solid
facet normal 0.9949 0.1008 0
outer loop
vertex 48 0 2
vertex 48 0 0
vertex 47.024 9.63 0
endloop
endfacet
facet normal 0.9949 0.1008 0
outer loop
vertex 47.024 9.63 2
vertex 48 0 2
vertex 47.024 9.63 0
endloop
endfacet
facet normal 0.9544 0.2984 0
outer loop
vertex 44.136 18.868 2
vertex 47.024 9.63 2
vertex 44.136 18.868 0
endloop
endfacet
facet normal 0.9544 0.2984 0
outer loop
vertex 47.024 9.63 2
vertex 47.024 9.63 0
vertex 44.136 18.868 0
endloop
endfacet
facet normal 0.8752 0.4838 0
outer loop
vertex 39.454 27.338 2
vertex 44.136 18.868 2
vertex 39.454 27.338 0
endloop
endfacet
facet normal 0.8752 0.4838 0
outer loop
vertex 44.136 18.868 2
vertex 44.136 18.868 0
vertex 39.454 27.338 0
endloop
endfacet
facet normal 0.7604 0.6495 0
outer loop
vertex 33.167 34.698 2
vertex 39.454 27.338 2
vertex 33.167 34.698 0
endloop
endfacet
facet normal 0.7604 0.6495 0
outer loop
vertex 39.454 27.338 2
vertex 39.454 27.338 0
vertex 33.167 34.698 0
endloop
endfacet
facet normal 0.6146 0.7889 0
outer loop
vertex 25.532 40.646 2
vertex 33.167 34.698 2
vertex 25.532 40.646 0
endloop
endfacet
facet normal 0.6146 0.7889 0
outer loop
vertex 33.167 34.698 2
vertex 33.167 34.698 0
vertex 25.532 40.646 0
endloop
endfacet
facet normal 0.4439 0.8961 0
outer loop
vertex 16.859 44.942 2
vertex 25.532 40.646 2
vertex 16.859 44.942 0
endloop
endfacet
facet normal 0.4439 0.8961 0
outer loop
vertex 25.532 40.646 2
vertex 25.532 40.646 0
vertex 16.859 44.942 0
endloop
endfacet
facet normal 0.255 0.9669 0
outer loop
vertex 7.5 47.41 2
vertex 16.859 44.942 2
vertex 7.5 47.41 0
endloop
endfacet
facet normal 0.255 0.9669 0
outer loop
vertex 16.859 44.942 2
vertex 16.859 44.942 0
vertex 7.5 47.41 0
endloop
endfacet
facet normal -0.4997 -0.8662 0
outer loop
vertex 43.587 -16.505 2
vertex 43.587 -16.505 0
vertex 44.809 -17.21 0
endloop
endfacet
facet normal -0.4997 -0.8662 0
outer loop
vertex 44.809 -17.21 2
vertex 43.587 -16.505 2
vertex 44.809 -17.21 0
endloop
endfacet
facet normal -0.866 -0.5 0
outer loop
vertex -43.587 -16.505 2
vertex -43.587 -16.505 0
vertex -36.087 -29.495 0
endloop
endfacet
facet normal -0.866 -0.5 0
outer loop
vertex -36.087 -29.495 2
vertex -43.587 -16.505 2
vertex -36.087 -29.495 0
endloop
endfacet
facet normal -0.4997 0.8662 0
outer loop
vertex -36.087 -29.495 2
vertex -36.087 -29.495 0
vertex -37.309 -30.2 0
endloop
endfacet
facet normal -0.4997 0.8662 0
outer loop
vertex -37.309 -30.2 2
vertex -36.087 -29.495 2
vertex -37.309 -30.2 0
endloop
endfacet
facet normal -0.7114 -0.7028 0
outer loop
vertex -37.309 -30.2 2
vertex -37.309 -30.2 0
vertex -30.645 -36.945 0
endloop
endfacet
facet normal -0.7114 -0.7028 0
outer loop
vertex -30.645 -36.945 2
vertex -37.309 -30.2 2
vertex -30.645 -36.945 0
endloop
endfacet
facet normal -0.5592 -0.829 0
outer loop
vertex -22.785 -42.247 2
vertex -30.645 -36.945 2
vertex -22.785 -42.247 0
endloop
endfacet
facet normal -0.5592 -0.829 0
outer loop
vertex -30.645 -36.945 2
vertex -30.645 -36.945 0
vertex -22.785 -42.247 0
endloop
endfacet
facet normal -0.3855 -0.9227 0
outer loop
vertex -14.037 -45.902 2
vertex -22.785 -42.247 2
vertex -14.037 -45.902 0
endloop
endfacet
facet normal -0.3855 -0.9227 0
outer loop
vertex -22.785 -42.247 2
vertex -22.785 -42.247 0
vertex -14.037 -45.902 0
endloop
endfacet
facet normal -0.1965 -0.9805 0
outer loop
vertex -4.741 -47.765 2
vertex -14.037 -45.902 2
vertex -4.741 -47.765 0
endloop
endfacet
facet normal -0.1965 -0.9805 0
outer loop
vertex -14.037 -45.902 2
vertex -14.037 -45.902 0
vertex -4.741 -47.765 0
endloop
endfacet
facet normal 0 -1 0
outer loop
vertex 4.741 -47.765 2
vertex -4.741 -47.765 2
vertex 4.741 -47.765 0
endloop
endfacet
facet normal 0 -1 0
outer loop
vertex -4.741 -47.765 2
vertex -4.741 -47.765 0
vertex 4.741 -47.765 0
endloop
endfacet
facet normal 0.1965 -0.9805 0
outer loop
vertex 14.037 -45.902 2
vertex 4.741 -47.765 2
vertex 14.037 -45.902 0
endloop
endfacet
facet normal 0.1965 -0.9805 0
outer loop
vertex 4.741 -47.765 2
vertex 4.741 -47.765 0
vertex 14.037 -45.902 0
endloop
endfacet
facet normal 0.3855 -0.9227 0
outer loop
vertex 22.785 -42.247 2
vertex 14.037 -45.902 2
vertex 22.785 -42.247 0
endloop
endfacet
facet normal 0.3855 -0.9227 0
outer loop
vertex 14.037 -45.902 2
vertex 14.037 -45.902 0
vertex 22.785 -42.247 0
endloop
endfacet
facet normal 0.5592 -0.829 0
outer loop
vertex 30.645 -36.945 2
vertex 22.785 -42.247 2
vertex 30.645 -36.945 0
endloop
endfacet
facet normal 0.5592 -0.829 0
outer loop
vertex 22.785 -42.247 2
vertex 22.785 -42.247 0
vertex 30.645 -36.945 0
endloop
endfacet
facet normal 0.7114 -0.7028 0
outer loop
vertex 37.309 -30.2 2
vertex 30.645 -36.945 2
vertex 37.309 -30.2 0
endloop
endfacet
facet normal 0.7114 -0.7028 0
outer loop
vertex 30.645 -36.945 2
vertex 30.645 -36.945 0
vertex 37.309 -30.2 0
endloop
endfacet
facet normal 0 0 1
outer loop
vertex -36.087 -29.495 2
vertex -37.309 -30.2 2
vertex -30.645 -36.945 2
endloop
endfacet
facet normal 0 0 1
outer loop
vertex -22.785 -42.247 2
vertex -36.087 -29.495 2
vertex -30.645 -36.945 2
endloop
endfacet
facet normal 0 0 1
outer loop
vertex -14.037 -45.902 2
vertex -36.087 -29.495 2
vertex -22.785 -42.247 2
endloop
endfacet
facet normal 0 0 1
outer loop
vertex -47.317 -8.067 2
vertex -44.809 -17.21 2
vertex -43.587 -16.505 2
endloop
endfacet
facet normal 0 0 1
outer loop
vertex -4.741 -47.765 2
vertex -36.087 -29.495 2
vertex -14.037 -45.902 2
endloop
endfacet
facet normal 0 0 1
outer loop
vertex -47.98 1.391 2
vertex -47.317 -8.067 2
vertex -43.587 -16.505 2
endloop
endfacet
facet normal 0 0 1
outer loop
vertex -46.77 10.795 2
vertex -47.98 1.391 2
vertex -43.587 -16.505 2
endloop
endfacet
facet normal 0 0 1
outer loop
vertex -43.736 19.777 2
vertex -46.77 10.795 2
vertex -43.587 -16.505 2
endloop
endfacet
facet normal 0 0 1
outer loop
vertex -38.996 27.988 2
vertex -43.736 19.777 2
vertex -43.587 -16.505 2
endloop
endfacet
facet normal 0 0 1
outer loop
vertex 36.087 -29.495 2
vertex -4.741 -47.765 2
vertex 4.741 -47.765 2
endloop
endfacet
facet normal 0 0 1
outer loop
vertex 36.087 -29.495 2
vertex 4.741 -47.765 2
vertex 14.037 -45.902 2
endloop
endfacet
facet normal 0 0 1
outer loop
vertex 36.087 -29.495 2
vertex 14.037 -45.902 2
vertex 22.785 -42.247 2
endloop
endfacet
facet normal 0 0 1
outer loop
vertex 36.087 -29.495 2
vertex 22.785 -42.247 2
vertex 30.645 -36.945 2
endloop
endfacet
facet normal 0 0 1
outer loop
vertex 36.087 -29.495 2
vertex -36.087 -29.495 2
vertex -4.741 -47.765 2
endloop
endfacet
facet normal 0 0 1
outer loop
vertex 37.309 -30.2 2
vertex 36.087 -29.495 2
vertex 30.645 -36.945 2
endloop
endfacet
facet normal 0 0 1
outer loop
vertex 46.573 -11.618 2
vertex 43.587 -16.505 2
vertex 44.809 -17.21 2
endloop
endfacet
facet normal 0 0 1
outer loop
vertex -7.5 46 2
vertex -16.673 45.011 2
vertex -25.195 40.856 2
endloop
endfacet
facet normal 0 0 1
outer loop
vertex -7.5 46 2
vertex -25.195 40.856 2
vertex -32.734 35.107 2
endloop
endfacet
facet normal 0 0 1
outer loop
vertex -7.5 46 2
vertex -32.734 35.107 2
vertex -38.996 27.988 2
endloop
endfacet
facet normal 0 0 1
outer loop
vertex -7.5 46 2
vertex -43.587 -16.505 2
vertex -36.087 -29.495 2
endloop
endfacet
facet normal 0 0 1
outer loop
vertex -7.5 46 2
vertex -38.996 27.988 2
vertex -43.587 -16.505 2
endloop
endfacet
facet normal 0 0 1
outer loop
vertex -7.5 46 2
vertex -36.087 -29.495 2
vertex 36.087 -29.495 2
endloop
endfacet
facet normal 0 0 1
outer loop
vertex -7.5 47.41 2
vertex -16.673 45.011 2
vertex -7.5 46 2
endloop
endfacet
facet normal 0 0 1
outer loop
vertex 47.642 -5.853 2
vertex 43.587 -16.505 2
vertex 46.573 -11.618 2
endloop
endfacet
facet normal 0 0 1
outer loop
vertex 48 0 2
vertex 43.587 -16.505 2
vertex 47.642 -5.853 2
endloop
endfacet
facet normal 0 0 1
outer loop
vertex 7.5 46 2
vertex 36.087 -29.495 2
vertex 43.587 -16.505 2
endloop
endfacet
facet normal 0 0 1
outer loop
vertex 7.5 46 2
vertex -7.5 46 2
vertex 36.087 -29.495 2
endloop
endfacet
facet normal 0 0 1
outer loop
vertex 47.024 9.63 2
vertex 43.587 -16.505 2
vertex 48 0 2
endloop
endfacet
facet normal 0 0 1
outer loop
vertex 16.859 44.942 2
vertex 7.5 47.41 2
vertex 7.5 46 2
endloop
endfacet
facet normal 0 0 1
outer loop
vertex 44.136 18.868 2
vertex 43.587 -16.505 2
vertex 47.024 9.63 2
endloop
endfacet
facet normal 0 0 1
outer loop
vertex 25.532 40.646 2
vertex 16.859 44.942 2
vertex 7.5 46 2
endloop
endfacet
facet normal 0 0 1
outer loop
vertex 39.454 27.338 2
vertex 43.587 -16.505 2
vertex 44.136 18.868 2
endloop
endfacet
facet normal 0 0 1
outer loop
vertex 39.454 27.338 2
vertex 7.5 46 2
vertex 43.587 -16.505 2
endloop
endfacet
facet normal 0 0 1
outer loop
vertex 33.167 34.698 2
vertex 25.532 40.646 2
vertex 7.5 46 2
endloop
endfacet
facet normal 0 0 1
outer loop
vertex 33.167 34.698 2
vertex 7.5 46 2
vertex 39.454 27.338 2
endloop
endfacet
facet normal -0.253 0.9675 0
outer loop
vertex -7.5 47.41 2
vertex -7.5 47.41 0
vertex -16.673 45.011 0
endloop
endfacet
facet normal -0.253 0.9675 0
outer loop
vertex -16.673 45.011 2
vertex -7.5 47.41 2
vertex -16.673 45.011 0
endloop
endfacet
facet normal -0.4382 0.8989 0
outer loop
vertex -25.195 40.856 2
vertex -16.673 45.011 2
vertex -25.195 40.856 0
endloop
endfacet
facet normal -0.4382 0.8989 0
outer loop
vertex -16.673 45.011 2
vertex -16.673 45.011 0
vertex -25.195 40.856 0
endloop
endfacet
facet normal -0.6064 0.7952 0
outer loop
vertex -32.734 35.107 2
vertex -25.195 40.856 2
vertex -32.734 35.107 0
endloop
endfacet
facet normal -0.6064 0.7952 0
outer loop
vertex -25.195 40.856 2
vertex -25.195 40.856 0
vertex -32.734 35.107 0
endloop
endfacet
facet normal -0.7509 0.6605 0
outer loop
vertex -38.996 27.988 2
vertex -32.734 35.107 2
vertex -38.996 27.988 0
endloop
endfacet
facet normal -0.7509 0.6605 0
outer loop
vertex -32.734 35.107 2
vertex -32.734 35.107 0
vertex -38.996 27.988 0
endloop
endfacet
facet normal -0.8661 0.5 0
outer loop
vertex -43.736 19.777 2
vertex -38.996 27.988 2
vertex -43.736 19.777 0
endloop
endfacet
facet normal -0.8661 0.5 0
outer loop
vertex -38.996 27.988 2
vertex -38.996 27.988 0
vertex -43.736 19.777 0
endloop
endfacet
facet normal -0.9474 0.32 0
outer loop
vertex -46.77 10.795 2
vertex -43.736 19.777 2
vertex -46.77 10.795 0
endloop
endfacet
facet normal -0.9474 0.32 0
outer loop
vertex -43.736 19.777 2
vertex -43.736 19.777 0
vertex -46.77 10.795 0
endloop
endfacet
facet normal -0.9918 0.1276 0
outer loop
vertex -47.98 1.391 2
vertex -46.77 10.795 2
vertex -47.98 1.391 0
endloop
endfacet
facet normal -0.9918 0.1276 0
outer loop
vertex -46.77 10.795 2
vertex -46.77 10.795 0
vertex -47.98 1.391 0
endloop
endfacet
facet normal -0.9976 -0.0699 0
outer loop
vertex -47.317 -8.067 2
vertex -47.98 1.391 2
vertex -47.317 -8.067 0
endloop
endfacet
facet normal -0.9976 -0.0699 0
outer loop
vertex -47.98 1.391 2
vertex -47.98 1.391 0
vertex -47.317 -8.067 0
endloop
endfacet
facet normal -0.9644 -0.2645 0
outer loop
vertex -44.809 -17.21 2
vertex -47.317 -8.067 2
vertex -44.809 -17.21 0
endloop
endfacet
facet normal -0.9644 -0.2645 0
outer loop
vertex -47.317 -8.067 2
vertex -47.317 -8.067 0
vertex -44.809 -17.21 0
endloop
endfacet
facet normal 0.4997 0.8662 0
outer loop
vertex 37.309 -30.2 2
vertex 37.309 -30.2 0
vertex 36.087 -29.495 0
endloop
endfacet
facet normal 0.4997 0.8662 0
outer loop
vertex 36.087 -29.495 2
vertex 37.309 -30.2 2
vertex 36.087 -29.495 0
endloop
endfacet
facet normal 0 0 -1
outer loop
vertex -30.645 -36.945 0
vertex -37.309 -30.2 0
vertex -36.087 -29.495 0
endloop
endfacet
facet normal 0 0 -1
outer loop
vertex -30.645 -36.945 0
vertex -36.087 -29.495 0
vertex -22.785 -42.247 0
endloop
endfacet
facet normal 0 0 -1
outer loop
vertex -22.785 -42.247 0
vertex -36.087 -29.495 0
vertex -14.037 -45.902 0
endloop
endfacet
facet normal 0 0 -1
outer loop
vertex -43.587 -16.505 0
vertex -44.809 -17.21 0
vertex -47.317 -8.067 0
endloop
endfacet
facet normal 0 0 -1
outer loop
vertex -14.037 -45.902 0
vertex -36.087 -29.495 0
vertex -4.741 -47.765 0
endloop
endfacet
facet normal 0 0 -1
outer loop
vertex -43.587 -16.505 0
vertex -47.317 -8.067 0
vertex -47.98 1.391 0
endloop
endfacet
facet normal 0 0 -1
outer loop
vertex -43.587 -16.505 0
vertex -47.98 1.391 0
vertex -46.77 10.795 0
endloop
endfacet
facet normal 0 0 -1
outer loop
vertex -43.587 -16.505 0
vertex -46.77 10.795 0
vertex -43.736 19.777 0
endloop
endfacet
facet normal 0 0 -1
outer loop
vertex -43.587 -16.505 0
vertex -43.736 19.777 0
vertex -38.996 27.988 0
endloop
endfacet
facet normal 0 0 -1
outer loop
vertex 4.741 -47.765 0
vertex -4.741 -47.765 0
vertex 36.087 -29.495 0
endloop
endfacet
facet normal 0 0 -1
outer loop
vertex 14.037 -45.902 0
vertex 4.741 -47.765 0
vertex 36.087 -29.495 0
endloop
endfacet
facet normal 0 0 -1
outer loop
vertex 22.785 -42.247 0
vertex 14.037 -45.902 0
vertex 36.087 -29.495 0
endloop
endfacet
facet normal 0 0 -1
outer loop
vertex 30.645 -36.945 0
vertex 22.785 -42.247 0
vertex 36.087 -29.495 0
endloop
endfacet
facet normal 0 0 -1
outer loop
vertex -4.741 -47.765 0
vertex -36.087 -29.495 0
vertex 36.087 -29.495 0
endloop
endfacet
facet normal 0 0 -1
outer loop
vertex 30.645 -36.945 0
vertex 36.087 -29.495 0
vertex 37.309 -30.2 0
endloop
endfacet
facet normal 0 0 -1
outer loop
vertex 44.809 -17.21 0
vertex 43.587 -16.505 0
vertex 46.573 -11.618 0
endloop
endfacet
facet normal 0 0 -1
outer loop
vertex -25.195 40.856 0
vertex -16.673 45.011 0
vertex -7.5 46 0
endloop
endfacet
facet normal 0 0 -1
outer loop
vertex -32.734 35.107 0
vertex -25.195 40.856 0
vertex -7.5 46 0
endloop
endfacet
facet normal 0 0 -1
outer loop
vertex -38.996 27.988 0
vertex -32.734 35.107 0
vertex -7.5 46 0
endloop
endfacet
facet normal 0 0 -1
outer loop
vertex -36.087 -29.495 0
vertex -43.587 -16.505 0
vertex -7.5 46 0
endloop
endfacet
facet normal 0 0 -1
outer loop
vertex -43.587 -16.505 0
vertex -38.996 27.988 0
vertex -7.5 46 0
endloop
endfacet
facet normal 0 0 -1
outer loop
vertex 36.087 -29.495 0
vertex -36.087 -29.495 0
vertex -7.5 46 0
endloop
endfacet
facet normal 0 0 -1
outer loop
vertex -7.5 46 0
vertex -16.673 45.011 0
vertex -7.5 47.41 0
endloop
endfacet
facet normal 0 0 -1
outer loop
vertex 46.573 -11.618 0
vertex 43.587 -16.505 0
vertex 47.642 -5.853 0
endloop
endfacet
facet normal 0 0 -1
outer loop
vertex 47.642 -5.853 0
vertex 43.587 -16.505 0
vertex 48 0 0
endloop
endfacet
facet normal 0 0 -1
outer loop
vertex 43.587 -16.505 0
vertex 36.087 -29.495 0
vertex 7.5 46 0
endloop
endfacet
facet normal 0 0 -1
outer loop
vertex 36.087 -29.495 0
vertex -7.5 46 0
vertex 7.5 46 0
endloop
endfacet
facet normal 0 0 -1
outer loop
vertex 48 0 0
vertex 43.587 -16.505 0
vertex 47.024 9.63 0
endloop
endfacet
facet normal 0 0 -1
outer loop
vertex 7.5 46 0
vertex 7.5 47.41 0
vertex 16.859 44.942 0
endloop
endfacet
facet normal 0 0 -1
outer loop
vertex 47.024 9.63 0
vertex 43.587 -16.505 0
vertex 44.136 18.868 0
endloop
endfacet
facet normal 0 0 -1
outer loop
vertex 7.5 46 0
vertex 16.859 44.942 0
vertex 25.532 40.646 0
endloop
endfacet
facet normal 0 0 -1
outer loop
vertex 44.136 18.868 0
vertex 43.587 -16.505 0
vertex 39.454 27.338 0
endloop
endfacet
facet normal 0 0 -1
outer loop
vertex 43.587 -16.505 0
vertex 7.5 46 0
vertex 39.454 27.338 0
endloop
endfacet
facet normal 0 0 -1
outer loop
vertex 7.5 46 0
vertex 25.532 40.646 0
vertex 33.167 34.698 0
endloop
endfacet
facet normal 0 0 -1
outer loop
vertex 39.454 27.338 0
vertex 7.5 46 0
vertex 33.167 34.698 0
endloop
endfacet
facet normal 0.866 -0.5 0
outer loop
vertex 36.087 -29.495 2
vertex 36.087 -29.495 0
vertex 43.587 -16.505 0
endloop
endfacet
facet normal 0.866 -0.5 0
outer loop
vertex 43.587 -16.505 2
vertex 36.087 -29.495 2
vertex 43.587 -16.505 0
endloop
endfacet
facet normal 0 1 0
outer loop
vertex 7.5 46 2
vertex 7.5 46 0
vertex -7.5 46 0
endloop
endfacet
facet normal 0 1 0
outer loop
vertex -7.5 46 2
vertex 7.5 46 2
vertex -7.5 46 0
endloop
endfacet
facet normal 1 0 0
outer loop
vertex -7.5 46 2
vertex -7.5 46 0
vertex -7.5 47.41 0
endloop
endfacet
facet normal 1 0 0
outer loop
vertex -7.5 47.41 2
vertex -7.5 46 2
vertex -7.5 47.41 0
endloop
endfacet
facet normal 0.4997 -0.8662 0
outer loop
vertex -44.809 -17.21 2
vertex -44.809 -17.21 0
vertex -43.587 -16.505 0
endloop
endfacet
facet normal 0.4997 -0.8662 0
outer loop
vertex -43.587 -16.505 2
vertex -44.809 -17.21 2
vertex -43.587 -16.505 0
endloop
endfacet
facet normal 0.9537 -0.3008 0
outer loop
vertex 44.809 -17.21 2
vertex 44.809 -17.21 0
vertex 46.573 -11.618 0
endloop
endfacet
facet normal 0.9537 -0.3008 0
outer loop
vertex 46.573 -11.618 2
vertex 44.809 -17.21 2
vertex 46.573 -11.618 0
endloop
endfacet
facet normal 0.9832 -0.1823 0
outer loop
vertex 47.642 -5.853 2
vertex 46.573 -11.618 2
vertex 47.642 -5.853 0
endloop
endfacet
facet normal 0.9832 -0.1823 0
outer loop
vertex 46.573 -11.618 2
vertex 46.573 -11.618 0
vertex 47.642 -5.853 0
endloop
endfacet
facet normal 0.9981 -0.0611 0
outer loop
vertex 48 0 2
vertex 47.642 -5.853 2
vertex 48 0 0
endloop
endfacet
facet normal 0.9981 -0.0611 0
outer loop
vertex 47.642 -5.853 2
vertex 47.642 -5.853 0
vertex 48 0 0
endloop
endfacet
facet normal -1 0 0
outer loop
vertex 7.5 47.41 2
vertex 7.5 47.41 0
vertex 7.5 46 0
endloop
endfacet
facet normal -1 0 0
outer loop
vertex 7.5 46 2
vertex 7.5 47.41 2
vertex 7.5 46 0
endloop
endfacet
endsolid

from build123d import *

# Parameters (mm, degrees)
EXTRUDE_1_DEPTH = 2


with BuildPart() as part:
    # Эскиз1 → Бобышка-Вытянуть1 (new body)
    with BuildSketch(Plane.XY):
        with BuildLine():
            Line((43.587168574, -16.504809472), (44.80864708, -17.210030416))
            ThreePointArc((44.80864708, -17.210030416), (47.195418527, -8.751712409), (48, 0))
            ThreePointArc((48, 0), (36.496575182, 31.176914536), (7.5, 47.410441888))
            Line((7.5, 47.410441888), (7.5, 46))
            Line((7.5, 46), (-7.5, 46))
            Line((-7.5, 46), (-7.5, 47.410441888))
            ThreePointArc((-7.5, 47.410441888), (-41.569219382, 24), (-44.80864708, -17.210030416))
            Line((-44.80864708, -17.210030416), (-43.587168574, -16.504809472))
            Line((-43.587168574, -16.504809472), (-36.087168574, -29.495190528))
            Line((-36.087168574, -29.495190528), (-37.30864708, -30.200411472))
            ThreePointArc((-37.30864708, -30.200411472), (0, -48), (37.30864708, -30.200411472))
            Line((37.30864708, -30.200411472), (36.087168574, -29.495190528))
            Line((36.087168574, -29.495190528), (43.587168574, -16.504809472))
        make_face()
    extrude(amount=EXTRUDE_1_DEPTH)


solid = part.part
